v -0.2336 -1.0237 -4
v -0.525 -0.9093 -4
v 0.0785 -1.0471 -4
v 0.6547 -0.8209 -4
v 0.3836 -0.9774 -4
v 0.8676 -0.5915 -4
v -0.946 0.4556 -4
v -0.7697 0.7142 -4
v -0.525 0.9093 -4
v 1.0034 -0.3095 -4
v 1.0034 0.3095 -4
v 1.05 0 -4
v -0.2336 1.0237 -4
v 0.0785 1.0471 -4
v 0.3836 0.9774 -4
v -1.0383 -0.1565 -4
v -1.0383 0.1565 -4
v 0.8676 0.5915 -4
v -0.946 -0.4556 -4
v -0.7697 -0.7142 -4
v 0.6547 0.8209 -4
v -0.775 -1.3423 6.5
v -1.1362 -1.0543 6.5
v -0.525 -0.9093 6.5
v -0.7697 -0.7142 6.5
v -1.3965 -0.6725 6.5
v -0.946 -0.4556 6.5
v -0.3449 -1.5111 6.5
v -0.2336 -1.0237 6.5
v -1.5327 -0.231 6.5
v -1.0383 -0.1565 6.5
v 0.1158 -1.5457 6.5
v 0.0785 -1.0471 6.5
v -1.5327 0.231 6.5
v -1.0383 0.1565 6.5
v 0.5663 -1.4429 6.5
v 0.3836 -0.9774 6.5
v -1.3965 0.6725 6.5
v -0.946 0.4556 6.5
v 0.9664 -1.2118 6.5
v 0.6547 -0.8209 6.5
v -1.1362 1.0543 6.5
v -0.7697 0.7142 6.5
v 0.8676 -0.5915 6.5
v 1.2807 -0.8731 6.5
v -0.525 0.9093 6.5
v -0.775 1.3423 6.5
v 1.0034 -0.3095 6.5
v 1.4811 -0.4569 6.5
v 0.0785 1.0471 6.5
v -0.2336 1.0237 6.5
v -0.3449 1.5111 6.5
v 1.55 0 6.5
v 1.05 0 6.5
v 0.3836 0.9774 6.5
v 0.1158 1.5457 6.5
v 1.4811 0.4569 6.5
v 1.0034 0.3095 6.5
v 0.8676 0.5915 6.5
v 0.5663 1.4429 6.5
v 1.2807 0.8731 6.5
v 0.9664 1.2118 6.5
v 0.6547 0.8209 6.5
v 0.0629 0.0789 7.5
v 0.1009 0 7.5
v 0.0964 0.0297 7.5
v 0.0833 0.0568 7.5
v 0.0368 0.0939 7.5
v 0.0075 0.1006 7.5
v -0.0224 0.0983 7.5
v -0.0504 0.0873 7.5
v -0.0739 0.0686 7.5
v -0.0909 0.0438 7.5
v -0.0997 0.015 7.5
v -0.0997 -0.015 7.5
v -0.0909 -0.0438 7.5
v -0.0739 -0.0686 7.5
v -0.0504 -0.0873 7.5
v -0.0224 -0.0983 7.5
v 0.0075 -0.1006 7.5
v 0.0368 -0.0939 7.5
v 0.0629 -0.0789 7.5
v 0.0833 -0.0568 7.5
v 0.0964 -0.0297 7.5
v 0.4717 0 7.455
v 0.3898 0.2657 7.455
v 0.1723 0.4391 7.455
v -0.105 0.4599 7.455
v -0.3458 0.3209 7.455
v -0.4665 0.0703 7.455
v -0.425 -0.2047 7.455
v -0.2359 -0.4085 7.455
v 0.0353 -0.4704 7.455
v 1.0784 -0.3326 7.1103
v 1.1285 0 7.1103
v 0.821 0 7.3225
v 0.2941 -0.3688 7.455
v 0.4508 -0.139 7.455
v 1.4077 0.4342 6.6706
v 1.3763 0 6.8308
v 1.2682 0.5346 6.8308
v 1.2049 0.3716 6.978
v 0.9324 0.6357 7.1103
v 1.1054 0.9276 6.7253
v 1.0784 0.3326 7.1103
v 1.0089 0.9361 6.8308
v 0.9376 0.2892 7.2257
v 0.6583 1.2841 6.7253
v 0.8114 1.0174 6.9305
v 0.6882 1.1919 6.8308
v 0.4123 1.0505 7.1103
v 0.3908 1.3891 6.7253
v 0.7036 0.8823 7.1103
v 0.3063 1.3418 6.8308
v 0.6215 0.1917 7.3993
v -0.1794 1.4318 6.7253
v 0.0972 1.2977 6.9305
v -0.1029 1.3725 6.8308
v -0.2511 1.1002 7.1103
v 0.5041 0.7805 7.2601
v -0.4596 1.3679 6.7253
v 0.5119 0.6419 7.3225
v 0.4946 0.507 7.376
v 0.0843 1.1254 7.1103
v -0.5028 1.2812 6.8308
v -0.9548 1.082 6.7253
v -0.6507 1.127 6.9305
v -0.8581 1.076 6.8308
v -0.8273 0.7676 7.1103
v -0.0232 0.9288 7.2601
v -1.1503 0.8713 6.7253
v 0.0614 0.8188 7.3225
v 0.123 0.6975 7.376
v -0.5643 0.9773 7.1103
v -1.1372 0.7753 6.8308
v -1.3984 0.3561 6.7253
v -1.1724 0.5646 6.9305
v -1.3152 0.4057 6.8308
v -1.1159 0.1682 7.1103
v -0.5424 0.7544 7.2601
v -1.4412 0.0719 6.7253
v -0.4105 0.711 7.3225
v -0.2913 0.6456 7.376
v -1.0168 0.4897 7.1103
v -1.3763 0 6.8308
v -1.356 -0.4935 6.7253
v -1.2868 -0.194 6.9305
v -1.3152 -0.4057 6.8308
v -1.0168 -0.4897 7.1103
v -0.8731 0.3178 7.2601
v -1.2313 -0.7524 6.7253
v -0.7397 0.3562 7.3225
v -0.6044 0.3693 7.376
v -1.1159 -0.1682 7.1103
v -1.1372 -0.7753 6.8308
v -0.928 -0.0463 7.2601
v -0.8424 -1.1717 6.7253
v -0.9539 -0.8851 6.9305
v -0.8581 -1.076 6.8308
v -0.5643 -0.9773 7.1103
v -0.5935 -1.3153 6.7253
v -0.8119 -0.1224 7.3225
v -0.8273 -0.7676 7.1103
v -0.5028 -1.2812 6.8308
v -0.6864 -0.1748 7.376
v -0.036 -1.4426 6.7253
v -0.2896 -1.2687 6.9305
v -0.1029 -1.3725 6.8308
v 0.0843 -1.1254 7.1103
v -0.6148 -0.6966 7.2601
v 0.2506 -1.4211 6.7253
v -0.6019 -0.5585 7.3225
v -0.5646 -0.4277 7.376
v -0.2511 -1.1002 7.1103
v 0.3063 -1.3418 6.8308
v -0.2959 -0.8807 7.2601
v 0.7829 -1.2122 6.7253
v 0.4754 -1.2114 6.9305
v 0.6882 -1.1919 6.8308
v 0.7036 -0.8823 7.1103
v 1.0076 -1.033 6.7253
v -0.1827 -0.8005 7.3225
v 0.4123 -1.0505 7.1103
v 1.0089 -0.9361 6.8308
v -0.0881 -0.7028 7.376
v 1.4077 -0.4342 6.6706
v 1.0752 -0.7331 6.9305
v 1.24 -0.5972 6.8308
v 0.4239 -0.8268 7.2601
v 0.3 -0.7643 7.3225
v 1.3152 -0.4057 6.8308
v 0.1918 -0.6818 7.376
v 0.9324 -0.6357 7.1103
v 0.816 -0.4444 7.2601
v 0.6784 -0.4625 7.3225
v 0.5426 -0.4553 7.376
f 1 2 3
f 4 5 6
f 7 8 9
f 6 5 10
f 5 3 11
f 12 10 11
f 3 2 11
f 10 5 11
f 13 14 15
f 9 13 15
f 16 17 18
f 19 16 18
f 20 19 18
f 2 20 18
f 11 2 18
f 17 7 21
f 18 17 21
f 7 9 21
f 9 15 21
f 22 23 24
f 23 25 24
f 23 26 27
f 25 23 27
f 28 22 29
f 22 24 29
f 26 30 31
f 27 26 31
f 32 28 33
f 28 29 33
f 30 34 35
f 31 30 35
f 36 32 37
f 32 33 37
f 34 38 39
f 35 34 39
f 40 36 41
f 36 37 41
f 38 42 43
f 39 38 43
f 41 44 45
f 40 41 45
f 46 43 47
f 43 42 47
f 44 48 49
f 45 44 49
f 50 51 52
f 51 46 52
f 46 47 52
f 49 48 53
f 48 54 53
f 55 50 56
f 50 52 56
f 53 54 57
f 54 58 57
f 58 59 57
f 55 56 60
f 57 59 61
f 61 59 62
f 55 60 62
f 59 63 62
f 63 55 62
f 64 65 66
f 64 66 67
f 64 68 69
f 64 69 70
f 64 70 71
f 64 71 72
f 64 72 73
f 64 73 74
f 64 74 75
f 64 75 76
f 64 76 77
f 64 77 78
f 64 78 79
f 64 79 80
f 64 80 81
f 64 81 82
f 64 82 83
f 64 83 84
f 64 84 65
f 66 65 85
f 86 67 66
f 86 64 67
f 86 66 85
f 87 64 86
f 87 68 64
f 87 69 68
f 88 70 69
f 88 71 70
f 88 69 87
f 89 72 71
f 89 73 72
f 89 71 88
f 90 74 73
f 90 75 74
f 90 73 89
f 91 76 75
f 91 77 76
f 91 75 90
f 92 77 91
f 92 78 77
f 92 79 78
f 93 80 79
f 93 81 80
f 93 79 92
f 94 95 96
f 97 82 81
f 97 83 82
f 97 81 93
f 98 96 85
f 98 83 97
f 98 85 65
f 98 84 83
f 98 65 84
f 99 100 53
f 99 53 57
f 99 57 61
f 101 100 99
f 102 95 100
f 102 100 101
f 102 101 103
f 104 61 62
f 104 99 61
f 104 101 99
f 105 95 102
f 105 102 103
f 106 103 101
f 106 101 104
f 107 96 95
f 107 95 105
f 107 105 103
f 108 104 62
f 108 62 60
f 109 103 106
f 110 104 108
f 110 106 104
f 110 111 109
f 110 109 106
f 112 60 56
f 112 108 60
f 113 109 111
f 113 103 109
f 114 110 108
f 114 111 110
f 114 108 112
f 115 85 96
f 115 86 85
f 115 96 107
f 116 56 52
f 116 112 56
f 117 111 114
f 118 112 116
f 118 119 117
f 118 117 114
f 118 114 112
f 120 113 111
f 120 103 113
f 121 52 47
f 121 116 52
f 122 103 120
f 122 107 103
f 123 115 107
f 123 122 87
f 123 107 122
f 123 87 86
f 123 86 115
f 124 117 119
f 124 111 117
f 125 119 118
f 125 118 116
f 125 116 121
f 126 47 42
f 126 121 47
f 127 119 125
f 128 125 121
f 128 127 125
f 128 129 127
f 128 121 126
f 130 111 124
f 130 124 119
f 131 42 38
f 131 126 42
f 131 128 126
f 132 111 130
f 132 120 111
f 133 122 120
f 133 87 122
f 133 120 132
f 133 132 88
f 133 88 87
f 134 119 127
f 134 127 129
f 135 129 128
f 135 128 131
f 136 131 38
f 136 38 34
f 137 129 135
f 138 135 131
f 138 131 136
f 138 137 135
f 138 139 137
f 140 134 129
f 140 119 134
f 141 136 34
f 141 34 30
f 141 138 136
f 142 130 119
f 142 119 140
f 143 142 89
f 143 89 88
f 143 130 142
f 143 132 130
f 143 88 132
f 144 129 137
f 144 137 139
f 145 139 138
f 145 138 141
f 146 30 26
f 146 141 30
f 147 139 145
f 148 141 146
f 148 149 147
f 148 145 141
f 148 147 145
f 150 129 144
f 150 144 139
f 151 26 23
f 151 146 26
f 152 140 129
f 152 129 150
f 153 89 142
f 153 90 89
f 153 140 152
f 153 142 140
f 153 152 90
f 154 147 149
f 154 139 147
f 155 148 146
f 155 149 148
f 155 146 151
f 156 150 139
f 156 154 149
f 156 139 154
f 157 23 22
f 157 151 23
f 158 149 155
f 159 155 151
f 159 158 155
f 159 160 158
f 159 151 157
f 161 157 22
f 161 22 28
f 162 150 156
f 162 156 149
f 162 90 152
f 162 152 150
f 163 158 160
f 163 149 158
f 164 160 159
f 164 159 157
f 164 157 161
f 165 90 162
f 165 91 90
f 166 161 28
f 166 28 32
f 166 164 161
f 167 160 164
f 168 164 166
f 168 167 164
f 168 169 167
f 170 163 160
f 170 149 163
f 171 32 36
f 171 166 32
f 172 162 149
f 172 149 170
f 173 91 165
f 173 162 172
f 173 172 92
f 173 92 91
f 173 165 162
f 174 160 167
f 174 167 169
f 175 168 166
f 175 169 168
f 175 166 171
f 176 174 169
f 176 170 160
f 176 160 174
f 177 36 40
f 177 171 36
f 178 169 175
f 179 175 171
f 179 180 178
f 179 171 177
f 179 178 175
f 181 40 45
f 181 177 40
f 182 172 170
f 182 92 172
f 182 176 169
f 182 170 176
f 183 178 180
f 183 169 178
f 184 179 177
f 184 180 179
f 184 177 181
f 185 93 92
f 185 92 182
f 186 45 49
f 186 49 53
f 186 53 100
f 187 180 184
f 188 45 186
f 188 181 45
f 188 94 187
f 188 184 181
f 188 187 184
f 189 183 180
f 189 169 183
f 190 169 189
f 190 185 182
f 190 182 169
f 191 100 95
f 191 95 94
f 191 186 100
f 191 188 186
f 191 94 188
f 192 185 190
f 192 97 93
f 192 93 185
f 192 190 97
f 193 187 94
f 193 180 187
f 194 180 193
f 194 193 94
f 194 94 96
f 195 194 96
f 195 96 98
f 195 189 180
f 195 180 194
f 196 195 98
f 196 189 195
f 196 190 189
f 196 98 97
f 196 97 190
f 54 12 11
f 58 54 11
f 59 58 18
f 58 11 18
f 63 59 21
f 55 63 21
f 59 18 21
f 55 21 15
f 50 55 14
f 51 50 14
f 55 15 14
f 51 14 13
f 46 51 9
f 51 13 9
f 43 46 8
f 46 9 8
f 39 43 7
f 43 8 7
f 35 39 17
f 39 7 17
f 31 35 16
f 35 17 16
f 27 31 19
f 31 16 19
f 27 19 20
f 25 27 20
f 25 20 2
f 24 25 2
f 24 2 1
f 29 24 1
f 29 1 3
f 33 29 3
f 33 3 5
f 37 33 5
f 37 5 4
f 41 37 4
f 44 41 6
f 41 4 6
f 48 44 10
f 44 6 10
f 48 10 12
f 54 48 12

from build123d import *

# Parameters (mm, degrees)
DODANIE_WYCI_GNI_CIE1_DEPTH      = 6.5
DODANIE_WYCI_GNI_CIE1_DEPTH_BACK = 4
SZKIC1_R                         = 1.05
SZKIC2_R                         = 1.55
DODANIE_WYCI_GNI_CIE2_DEPTH      = 1
ZAOKR_GLENIE1_R                  = 1.55


with BuildPart() as part:
    # Szkic1 → Dodanie-wyciągnięcie1 (new, two sides: drawn at the far end of the back side and taken through both)
    with BuildSketch(Plane.XY.offset(-DODANIE_WYCI_GNI_CIE1_DEPTH_BACK)):
        Circle(SZKIC1_R)
    extrude(amount=DODANIE_WYCI_GNI_CIE1_DEPTH + DODANIE_WYCI_GNI_CIE1_DEPTH_BACK)

    # Szkic2 → Dodanie-wyciągnięcie2 (add)
    with BuildSketch(Plane.XY.offset(6.5)):
        Circle(SZKIC2_R)
    extrude(amount=DODANIE_WYCI_GNI_CIE2_DEPTH)

    # Zaokrąglenie1
    # the kernel refuses this fillet: 1.55 mm, written as the material it takes off along each edge
    with BuildSketch(Plane(origin=(0, 0, 7.5), x_dir=(1, 0, 0), z_dir=(0, -1, 0))) as zaokr_glenie1_piece_1:
        with BuildLine():
            CenterArc((0.100862325, -1.55), ZAOKR_GLENIE1_R, 20.783559596, 69.216440404)
            Line((0.100862325, 0), (0.100862325, 0.031))
            Line((0.100862325, 0.031), (1.55, 0.031))
            Line((1.55, 0.031), (1.581, 0))
            ThreePointArc((1.581, 0), (1.581, -0.5), (1.578982753, -0.989))
            Line((1.578982753, -0.989), (1.55, -1))
        make_face()
    revolve(axis=Axis((0, 0, 7.5), (0, 0, 1)), mode=Mode.SUBTRACT)


solid = part.part
